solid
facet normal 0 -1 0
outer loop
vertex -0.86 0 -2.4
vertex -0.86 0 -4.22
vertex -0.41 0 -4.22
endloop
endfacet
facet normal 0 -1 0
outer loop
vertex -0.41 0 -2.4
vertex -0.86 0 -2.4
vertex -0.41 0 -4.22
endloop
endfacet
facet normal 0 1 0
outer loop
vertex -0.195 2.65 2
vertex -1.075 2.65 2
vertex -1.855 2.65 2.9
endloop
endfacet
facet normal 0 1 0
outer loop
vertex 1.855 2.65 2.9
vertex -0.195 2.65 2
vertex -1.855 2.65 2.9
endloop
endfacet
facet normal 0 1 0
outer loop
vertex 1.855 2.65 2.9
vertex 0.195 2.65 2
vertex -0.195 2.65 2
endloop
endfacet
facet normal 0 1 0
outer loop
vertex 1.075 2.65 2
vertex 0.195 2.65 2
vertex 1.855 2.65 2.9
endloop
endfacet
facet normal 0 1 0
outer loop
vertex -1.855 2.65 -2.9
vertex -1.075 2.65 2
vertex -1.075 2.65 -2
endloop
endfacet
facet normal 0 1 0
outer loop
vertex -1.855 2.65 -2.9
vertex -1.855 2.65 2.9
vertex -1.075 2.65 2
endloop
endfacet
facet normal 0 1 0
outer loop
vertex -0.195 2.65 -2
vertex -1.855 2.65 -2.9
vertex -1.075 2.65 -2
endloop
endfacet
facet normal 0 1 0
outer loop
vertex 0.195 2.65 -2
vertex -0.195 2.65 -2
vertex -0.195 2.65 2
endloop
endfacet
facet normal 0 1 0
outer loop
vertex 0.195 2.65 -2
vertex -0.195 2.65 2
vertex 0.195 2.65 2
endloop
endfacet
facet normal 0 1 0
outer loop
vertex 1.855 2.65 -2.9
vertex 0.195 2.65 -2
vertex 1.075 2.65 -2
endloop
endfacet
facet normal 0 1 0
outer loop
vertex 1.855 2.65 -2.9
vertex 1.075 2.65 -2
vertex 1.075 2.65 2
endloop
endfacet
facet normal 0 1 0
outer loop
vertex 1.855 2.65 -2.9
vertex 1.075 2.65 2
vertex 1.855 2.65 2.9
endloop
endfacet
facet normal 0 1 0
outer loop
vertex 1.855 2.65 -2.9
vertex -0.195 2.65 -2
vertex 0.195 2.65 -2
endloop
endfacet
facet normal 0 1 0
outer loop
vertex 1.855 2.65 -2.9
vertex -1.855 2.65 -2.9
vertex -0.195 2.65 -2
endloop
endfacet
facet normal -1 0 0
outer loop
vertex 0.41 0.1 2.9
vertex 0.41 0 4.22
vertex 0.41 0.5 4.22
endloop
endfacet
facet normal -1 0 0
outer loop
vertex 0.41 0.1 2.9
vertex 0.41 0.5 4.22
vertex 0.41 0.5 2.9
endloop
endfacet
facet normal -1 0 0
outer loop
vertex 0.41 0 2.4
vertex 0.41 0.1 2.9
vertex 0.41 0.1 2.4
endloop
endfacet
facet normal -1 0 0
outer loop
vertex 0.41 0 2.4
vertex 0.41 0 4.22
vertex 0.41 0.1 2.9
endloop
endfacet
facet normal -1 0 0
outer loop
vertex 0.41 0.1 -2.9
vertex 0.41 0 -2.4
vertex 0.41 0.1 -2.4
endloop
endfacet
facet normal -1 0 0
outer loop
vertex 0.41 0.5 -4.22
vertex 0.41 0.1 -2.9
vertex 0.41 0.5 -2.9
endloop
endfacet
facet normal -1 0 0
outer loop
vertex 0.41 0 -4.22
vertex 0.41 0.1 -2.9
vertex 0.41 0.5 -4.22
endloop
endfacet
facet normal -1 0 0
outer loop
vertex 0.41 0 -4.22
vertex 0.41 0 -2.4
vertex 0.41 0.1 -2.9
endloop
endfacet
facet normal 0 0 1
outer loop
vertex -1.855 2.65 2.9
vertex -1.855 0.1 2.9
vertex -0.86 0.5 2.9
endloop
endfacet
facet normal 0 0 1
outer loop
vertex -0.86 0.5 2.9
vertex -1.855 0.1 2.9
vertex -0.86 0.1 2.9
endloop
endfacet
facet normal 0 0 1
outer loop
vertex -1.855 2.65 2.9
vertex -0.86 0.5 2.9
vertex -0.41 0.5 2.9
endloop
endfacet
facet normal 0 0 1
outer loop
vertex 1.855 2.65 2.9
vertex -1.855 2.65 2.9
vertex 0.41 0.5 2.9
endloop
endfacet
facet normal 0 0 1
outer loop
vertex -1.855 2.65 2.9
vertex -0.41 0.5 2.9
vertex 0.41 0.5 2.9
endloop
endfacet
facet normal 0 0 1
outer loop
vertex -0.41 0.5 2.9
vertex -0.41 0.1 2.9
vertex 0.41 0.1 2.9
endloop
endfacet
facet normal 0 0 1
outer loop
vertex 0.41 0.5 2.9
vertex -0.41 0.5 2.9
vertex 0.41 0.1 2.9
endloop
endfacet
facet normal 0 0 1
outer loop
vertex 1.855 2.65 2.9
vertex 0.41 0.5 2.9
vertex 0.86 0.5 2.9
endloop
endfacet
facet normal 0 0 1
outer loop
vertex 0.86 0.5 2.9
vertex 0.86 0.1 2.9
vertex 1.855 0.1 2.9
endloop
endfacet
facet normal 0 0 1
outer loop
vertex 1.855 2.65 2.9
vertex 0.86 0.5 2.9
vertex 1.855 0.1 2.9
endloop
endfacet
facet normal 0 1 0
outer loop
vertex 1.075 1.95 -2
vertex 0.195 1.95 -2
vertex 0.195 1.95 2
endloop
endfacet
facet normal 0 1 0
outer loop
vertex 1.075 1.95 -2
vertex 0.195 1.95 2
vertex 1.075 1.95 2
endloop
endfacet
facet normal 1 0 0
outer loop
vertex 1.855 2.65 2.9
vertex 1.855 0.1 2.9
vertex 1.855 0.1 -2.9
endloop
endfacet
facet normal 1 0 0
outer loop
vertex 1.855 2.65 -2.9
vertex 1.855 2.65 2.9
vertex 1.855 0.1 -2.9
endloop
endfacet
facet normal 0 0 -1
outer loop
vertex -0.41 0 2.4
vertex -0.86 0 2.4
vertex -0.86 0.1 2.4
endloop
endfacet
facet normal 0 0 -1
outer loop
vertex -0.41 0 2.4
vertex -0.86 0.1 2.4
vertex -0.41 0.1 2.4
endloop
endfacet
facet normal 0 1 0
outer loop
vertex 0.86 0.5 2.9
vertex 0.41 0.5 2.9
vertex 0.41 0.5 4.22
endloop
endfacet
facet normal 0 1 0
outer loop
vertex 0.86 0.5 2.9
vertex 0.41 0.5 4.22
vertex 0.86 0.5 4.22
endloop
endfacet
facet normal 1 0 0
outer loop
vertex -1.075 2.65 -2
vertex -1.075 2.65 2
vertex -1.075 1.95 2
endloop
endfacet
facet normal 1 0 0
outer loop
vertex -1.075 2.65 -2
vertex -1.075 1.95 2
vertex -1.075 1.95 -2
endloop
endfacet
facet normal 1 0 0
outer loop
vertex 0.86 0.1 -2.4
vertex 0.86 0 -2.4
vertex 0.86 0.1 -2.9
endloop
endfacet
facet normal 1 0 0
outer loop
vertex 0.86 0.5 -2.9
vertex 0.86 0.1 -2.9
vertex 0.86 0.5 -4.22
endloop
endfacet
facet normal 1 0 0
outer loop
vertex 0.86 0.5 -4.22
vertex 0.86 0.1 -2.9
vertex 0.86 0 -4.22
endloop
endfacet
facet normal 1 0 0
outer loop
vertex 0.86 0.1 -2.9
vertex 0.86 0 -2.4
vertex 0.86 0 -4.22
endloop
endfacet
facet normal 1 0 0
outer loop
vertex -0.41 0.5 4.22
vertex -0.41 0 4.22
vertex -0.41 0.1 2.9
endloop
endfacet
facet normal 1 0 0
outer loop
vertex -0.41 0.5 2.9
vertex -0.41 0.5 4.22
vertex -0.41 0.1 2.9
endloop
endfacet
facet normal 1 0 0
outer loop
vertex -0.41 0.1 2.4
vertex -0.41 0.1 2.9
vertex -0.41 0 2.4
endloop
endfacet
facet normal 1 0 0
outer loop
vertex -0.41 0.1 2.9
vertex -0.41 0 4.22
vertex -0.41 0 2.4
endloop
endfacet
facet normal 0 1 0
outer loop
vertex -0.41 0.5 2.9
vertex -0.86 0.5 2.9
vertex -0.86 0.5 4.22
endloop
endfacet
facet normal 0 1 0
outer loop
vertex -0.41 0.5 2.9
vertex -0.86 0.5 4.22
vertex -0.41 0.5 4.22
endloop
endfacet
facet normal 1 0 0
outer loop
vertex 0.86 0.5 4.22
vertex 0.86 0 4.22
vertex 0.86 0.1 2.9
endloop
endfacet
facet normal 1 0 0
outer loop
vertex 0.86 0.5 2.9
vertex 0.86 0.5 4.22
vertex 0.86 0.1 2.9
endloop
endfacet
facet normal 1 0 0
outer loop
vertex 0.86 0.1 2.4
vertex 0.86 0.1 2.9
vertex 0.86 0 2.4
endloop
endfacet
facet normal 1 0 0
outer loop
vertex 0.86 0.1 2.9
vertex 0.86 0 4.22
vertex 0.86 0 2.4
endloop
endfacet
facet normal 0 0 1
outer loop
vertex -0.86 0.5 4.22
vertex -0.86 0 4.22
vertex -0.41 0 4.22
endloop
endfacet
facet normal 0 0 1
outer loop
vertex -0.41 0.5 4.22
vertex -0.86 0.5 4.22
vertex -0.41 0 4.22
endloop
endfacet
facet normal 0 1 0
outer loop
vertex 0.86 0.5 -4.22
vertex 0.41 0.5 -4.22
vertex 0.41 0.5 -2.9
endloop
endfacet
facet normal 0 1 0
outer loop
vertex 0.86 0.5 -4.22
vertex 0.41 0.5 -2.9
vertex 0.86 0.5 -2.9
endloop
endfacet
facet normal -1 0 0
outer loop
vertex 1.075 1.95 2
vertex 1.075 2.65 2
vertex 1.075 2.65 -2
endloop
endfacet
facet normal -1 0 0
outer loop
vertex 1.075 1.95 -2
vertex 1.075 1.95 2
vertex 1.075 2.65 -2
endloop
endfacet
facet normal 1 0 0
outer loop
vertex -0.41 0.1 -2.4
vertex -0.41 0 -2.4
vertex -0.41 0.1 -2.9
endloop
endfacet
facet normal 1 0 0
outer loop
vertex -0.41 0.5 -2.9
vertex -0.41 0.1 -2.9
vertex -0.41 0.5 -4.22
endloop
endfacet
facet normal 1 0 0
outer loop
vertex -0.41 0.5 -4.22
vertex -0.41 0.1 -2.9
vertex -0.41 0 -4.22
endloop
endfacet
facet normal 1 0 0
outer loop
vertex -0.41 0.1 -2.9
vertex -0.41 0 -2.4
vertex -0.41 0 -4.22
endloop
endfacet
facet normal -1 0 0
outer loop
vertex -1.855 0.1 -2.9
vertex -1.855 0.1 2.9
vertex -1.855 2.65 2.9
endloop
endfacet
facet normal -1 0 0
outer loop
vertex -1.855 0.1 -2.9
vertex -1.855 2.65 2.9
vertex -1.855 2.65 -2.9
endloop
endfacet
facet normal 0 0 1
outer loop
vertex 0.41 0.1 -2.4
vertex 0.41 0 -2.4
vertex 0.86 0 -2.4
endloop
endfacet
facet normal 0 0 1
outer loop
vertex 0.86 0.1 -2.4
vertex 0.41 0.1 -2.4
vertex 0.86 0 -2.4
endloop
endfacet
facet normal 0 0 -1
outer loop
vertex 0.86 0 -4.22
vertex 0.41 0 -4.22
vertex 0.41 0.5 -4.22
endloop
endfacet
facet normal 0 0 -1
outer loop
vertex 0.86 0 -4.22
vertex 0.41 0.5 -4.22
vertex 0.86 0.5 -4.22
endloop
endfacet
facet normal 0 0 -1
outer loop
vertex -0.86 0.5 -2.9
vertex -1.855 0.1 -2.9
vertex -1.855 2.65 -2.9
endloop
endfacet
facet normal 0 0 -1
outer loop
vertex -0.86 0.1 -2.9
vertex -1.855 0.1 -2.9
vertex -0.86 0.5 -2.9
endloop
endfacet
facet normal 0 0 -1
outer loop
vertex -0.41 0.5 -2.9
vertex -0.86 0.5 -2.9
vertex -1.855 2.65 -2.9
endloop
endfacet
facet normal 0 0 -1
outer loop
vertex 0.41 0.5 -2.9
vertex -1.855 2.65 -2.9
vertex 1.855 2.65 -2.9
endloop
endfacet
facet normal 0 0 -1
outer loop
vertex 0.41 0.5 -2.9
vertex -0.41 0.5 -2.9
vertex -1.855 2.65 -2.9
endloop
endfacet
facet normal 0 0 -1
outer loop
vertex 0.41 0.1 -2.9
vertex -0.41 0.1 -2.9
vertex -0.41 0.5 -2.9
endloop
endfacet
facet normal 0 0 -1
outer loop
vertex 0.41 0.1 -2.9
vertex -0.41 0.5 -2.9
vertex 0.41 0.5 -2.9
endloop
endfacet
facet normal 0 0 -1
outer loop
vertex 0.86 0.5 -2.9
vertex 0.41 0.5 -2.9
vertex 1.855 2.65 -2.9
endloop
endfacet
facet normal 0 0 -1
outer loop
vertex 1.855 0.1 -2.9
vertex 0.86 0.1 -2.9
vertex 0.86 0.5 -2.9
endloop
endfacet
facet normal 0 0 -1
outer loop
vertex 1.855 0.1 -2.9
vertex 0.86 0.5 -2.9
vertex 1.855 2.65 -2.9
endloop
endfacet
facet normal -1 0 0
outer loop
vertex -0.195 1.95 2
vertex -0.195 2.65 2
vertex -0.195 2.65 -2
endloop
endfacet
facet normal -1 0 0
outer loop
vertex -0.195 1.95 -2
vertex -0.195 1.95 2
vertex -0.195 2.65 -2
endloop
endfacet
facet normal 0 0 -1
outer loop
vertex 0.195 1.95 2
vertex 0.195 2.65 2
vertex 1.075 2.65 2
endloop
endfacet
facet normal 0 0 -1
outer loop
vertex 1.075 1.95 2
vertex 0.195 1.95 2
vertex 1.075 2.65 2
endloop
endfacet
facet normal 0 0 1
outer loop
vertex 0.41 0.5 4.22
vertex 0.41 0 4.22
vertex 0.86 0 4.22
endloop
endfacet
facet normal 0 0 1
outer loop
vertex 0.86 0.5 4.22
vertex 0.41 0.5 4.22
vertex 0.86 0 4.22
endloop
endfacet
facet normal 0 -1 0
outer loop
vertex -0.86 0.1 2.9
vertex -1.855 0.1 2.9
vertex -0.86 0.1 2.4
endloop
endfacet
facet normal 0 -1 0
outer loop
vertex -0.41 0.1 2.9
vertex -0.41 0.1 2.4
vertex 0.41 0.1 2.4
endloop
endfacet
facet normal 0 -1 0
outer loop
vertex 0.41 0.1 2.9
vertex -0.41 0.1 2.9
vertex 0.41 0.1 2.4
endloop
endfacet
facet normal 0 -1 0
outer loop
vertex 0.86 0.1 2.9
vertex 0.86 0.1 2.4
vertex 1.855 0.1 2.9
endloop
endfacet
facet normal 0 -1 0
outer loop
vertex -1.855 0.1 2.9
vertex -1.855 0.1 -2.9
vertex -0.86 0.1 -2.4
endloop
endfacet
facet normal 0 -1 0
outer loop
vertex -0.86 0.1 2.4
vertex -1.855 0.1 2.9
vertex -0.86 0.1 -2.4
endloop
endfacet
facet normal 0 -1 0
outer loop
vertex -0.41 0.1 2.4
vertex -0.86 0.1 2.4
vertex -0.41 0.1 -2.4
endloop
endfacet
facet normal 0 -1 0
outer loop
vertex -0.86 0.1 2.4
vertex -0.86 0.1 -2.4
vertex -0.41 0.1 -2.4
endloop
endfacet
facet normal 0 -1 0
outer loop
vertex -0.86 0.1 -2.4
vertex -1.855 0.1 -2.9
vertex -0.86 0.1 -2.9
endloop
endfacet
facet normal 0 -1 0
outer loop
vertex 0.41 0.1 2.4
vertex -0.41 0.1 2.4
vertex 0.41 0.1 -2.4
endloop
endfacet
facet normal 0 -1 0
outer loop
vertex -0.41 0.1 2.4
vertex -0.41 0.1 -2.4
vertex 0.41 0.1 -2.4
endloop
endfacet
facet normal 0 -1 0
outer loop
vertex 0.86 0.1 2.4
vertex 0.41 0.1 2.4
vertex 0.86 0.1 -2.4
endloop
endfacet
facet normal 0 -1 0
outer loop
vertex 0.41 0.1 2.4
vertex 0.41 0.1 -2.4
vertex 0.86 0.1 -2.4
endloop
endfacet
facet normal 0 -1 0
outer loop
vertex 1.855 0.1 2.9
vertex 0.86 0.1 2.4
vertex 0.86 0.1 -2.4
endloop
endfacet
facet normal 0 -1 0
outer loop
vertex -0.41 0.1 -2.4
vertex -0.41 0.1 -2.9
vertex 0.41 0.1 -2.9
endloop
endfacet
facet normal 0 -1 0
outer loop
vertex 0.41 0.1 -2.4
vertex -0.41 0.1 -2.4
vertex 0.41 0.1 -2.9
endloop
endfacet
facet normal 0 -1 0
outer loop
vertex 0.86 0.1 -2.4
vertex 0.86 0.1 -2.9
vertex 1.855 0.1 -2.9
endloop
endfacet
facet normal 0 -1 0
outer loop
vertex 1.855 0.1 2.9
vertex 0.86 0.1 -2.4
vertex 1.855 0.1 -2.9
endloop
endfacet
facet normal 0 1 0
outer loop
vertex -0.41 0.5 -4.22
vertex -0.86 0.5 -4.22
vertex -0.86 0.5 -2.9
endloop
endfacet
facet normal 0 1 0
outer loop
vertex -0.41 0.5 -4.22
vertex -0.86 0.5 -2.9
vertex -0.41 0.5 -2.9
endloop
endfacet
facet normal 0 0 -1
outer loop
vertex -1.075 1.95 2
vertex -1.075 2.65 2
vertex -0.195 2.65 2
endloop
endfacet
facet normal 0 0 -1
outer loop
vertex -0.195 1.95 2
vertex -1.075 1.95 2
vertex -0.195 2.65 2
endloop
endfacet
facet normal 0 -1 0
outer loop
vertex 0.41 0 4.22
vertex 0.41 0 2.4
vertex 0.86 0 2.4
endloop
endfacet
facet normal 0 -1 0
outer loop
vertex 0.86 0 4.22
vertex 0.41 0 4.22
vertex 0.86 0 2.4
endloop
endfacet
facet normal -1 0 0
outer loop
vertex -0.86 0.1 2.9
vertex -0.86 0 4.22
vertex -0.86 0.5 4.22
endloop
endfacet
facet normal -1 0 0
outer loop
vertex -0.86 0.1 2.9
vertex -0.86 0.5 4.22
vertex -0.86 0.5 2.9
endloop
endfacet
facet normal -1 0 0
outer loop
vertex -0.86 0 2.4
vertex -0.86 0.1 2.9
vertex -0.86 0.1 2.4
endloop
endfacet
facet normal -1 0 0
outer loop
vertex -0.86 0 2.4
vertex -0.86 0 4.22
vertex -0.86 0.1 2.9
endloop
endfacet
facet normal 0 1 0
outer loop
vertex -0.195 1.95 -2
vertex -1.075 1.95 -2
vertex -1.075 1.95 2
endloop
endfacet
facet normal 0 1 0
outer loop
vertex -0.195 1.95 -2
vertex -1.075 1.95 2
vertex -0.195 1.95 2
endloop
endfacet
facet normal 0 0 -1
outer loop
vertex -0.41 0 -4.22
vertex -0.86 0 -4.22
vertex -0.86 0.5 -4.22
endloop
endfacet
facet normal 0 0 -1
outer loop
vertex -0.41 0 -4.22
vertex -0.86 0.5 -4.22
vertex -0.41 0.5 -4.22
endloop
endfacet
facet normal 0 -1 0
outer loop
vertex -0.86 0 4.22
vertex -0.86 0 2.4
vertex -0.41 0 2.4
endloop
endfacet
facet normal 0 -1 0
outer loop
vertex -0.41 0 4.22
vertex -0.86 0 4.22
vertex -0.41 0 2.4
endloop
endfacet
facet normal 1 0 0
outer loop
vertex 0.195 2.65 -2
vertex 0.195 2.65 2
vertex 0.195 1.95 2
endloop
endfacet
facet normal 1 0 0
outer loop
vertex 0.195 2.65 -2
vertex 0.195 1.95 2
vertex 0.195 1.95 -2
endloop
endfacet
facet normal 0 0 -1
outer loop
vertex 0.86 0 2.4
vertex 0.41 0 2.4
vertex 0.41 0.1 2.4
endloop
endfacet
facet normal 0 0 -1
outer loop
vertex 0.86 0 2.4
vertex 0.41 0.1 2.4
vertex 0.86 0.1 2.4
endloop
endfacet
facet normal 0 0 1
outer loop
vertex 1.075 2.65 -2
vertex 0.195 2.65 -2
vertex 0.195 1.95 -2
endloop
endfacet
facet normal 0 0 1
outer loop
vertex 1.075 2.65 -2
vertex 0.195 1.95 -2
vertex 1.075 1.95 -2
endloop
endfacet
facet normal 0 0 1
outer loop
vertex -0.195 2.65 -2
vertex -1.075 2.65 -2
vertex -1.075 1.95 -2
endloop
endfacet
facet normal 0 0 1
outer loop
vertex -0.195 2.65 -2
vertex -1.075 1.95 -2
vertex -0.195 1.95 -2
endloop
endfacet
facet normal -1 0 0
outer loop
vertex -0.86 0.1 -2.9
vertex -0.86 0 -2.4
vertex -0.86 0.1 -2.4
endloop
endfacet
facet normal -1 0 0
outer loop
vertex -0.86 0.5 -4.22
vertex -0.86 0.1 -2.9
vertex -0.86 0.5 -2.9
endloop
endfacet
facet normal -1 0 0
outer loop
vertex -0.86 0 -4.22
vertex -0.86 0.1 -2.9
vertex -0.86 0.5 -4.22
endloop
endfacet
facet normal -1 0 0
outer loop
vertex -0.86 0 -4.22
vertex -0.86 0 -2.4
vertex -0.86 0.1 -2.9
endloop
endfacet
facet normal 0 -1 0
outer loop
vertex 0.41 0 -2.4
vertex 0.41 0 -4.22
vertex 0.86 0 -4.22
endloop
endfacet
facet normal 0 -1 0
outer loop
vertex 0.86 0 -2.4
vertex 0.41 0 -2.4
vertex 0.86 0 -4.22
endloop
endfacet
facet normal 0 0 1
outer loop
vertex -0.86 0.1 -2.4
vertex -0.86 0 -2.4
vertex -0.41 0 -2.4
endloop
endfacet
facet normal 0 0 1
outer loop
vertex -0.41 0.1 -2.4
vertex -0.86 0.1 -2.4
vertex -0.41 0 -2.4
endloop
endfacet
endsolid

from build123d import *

# Parameters (mm, degrees)
BOSS_EXTRUDE1_START = 0.1
SKETCH1_W           = 3.71
SKETCH1_H           = 5.8
BOSS_EXTRUDE1_DEPTH = 2.55
SKETCH2_W           = 0.45
SKETCH2_H           = 1.82
BOSS_EXTRUDE2_DEPTH = 0.5
SKETCH3_W           = 0.88
SKETCH3_H           = 4
CUT_EXTRUDE1_DEPTH  = 0.7


with BuildPart() as part:
    # Sketch1 → Boss-Extrude1 (new body)
    with BuildSketch(Plane(origin=(0, 0, 0), x_dir=(1, 0, 0), z_dir=(0, 1, 0)).offset(BOSS_EXTRUDE1_START)):
        Rectangle(SKETCH1_W, SKETCH1_H)
    extrude(amount=BOSS_EXTRUDE1_DEPTH)

    # Sketch2 → Boss-Extrude2 (add)
    with BuildSketch(Plane(origin=(0, 0, 0), x_dir=(1, 0, 0), z_dir=(0, 1, 0))):
        with Locations((0.635, -3.31)):
            Rectangle(SKETCH2_W, SKETCH2_H)
        with Locations((-0.635, -3.31)):
            Rectangle(SKETCH2_W, SKETCH2_H)
        with Locations((-0.635, 3.31)):
            Rectangle(SKETCH2_W, SKETCH2_H)
        with Locations((0.635, 3.31)):
            Rectangle(SKETCH2_W, SKETCH2_H)
    extrude(amount=BOSS_EXTRUDE2_DEPTH)

    # Sketch3 → Cut-Extrude1 (cut)
    with BuildSketch(Plane(origin=(0, 2.65, 0), x_dir=(1, 0, 0), z_dir=(0, 1, 0))):
        with Locations((-0.635, 0)):
            Rectangle(SKETCH3_W, SKETCH3_H)
        with Locations((0.635, 0)):
            Rectangle(SKETCH3_W, SKETCH3_H)
    extrude(amount=-CUT_EXTRUDE1_DEPTH, mode=Mode.SUBTRACT)


solid = part.part
